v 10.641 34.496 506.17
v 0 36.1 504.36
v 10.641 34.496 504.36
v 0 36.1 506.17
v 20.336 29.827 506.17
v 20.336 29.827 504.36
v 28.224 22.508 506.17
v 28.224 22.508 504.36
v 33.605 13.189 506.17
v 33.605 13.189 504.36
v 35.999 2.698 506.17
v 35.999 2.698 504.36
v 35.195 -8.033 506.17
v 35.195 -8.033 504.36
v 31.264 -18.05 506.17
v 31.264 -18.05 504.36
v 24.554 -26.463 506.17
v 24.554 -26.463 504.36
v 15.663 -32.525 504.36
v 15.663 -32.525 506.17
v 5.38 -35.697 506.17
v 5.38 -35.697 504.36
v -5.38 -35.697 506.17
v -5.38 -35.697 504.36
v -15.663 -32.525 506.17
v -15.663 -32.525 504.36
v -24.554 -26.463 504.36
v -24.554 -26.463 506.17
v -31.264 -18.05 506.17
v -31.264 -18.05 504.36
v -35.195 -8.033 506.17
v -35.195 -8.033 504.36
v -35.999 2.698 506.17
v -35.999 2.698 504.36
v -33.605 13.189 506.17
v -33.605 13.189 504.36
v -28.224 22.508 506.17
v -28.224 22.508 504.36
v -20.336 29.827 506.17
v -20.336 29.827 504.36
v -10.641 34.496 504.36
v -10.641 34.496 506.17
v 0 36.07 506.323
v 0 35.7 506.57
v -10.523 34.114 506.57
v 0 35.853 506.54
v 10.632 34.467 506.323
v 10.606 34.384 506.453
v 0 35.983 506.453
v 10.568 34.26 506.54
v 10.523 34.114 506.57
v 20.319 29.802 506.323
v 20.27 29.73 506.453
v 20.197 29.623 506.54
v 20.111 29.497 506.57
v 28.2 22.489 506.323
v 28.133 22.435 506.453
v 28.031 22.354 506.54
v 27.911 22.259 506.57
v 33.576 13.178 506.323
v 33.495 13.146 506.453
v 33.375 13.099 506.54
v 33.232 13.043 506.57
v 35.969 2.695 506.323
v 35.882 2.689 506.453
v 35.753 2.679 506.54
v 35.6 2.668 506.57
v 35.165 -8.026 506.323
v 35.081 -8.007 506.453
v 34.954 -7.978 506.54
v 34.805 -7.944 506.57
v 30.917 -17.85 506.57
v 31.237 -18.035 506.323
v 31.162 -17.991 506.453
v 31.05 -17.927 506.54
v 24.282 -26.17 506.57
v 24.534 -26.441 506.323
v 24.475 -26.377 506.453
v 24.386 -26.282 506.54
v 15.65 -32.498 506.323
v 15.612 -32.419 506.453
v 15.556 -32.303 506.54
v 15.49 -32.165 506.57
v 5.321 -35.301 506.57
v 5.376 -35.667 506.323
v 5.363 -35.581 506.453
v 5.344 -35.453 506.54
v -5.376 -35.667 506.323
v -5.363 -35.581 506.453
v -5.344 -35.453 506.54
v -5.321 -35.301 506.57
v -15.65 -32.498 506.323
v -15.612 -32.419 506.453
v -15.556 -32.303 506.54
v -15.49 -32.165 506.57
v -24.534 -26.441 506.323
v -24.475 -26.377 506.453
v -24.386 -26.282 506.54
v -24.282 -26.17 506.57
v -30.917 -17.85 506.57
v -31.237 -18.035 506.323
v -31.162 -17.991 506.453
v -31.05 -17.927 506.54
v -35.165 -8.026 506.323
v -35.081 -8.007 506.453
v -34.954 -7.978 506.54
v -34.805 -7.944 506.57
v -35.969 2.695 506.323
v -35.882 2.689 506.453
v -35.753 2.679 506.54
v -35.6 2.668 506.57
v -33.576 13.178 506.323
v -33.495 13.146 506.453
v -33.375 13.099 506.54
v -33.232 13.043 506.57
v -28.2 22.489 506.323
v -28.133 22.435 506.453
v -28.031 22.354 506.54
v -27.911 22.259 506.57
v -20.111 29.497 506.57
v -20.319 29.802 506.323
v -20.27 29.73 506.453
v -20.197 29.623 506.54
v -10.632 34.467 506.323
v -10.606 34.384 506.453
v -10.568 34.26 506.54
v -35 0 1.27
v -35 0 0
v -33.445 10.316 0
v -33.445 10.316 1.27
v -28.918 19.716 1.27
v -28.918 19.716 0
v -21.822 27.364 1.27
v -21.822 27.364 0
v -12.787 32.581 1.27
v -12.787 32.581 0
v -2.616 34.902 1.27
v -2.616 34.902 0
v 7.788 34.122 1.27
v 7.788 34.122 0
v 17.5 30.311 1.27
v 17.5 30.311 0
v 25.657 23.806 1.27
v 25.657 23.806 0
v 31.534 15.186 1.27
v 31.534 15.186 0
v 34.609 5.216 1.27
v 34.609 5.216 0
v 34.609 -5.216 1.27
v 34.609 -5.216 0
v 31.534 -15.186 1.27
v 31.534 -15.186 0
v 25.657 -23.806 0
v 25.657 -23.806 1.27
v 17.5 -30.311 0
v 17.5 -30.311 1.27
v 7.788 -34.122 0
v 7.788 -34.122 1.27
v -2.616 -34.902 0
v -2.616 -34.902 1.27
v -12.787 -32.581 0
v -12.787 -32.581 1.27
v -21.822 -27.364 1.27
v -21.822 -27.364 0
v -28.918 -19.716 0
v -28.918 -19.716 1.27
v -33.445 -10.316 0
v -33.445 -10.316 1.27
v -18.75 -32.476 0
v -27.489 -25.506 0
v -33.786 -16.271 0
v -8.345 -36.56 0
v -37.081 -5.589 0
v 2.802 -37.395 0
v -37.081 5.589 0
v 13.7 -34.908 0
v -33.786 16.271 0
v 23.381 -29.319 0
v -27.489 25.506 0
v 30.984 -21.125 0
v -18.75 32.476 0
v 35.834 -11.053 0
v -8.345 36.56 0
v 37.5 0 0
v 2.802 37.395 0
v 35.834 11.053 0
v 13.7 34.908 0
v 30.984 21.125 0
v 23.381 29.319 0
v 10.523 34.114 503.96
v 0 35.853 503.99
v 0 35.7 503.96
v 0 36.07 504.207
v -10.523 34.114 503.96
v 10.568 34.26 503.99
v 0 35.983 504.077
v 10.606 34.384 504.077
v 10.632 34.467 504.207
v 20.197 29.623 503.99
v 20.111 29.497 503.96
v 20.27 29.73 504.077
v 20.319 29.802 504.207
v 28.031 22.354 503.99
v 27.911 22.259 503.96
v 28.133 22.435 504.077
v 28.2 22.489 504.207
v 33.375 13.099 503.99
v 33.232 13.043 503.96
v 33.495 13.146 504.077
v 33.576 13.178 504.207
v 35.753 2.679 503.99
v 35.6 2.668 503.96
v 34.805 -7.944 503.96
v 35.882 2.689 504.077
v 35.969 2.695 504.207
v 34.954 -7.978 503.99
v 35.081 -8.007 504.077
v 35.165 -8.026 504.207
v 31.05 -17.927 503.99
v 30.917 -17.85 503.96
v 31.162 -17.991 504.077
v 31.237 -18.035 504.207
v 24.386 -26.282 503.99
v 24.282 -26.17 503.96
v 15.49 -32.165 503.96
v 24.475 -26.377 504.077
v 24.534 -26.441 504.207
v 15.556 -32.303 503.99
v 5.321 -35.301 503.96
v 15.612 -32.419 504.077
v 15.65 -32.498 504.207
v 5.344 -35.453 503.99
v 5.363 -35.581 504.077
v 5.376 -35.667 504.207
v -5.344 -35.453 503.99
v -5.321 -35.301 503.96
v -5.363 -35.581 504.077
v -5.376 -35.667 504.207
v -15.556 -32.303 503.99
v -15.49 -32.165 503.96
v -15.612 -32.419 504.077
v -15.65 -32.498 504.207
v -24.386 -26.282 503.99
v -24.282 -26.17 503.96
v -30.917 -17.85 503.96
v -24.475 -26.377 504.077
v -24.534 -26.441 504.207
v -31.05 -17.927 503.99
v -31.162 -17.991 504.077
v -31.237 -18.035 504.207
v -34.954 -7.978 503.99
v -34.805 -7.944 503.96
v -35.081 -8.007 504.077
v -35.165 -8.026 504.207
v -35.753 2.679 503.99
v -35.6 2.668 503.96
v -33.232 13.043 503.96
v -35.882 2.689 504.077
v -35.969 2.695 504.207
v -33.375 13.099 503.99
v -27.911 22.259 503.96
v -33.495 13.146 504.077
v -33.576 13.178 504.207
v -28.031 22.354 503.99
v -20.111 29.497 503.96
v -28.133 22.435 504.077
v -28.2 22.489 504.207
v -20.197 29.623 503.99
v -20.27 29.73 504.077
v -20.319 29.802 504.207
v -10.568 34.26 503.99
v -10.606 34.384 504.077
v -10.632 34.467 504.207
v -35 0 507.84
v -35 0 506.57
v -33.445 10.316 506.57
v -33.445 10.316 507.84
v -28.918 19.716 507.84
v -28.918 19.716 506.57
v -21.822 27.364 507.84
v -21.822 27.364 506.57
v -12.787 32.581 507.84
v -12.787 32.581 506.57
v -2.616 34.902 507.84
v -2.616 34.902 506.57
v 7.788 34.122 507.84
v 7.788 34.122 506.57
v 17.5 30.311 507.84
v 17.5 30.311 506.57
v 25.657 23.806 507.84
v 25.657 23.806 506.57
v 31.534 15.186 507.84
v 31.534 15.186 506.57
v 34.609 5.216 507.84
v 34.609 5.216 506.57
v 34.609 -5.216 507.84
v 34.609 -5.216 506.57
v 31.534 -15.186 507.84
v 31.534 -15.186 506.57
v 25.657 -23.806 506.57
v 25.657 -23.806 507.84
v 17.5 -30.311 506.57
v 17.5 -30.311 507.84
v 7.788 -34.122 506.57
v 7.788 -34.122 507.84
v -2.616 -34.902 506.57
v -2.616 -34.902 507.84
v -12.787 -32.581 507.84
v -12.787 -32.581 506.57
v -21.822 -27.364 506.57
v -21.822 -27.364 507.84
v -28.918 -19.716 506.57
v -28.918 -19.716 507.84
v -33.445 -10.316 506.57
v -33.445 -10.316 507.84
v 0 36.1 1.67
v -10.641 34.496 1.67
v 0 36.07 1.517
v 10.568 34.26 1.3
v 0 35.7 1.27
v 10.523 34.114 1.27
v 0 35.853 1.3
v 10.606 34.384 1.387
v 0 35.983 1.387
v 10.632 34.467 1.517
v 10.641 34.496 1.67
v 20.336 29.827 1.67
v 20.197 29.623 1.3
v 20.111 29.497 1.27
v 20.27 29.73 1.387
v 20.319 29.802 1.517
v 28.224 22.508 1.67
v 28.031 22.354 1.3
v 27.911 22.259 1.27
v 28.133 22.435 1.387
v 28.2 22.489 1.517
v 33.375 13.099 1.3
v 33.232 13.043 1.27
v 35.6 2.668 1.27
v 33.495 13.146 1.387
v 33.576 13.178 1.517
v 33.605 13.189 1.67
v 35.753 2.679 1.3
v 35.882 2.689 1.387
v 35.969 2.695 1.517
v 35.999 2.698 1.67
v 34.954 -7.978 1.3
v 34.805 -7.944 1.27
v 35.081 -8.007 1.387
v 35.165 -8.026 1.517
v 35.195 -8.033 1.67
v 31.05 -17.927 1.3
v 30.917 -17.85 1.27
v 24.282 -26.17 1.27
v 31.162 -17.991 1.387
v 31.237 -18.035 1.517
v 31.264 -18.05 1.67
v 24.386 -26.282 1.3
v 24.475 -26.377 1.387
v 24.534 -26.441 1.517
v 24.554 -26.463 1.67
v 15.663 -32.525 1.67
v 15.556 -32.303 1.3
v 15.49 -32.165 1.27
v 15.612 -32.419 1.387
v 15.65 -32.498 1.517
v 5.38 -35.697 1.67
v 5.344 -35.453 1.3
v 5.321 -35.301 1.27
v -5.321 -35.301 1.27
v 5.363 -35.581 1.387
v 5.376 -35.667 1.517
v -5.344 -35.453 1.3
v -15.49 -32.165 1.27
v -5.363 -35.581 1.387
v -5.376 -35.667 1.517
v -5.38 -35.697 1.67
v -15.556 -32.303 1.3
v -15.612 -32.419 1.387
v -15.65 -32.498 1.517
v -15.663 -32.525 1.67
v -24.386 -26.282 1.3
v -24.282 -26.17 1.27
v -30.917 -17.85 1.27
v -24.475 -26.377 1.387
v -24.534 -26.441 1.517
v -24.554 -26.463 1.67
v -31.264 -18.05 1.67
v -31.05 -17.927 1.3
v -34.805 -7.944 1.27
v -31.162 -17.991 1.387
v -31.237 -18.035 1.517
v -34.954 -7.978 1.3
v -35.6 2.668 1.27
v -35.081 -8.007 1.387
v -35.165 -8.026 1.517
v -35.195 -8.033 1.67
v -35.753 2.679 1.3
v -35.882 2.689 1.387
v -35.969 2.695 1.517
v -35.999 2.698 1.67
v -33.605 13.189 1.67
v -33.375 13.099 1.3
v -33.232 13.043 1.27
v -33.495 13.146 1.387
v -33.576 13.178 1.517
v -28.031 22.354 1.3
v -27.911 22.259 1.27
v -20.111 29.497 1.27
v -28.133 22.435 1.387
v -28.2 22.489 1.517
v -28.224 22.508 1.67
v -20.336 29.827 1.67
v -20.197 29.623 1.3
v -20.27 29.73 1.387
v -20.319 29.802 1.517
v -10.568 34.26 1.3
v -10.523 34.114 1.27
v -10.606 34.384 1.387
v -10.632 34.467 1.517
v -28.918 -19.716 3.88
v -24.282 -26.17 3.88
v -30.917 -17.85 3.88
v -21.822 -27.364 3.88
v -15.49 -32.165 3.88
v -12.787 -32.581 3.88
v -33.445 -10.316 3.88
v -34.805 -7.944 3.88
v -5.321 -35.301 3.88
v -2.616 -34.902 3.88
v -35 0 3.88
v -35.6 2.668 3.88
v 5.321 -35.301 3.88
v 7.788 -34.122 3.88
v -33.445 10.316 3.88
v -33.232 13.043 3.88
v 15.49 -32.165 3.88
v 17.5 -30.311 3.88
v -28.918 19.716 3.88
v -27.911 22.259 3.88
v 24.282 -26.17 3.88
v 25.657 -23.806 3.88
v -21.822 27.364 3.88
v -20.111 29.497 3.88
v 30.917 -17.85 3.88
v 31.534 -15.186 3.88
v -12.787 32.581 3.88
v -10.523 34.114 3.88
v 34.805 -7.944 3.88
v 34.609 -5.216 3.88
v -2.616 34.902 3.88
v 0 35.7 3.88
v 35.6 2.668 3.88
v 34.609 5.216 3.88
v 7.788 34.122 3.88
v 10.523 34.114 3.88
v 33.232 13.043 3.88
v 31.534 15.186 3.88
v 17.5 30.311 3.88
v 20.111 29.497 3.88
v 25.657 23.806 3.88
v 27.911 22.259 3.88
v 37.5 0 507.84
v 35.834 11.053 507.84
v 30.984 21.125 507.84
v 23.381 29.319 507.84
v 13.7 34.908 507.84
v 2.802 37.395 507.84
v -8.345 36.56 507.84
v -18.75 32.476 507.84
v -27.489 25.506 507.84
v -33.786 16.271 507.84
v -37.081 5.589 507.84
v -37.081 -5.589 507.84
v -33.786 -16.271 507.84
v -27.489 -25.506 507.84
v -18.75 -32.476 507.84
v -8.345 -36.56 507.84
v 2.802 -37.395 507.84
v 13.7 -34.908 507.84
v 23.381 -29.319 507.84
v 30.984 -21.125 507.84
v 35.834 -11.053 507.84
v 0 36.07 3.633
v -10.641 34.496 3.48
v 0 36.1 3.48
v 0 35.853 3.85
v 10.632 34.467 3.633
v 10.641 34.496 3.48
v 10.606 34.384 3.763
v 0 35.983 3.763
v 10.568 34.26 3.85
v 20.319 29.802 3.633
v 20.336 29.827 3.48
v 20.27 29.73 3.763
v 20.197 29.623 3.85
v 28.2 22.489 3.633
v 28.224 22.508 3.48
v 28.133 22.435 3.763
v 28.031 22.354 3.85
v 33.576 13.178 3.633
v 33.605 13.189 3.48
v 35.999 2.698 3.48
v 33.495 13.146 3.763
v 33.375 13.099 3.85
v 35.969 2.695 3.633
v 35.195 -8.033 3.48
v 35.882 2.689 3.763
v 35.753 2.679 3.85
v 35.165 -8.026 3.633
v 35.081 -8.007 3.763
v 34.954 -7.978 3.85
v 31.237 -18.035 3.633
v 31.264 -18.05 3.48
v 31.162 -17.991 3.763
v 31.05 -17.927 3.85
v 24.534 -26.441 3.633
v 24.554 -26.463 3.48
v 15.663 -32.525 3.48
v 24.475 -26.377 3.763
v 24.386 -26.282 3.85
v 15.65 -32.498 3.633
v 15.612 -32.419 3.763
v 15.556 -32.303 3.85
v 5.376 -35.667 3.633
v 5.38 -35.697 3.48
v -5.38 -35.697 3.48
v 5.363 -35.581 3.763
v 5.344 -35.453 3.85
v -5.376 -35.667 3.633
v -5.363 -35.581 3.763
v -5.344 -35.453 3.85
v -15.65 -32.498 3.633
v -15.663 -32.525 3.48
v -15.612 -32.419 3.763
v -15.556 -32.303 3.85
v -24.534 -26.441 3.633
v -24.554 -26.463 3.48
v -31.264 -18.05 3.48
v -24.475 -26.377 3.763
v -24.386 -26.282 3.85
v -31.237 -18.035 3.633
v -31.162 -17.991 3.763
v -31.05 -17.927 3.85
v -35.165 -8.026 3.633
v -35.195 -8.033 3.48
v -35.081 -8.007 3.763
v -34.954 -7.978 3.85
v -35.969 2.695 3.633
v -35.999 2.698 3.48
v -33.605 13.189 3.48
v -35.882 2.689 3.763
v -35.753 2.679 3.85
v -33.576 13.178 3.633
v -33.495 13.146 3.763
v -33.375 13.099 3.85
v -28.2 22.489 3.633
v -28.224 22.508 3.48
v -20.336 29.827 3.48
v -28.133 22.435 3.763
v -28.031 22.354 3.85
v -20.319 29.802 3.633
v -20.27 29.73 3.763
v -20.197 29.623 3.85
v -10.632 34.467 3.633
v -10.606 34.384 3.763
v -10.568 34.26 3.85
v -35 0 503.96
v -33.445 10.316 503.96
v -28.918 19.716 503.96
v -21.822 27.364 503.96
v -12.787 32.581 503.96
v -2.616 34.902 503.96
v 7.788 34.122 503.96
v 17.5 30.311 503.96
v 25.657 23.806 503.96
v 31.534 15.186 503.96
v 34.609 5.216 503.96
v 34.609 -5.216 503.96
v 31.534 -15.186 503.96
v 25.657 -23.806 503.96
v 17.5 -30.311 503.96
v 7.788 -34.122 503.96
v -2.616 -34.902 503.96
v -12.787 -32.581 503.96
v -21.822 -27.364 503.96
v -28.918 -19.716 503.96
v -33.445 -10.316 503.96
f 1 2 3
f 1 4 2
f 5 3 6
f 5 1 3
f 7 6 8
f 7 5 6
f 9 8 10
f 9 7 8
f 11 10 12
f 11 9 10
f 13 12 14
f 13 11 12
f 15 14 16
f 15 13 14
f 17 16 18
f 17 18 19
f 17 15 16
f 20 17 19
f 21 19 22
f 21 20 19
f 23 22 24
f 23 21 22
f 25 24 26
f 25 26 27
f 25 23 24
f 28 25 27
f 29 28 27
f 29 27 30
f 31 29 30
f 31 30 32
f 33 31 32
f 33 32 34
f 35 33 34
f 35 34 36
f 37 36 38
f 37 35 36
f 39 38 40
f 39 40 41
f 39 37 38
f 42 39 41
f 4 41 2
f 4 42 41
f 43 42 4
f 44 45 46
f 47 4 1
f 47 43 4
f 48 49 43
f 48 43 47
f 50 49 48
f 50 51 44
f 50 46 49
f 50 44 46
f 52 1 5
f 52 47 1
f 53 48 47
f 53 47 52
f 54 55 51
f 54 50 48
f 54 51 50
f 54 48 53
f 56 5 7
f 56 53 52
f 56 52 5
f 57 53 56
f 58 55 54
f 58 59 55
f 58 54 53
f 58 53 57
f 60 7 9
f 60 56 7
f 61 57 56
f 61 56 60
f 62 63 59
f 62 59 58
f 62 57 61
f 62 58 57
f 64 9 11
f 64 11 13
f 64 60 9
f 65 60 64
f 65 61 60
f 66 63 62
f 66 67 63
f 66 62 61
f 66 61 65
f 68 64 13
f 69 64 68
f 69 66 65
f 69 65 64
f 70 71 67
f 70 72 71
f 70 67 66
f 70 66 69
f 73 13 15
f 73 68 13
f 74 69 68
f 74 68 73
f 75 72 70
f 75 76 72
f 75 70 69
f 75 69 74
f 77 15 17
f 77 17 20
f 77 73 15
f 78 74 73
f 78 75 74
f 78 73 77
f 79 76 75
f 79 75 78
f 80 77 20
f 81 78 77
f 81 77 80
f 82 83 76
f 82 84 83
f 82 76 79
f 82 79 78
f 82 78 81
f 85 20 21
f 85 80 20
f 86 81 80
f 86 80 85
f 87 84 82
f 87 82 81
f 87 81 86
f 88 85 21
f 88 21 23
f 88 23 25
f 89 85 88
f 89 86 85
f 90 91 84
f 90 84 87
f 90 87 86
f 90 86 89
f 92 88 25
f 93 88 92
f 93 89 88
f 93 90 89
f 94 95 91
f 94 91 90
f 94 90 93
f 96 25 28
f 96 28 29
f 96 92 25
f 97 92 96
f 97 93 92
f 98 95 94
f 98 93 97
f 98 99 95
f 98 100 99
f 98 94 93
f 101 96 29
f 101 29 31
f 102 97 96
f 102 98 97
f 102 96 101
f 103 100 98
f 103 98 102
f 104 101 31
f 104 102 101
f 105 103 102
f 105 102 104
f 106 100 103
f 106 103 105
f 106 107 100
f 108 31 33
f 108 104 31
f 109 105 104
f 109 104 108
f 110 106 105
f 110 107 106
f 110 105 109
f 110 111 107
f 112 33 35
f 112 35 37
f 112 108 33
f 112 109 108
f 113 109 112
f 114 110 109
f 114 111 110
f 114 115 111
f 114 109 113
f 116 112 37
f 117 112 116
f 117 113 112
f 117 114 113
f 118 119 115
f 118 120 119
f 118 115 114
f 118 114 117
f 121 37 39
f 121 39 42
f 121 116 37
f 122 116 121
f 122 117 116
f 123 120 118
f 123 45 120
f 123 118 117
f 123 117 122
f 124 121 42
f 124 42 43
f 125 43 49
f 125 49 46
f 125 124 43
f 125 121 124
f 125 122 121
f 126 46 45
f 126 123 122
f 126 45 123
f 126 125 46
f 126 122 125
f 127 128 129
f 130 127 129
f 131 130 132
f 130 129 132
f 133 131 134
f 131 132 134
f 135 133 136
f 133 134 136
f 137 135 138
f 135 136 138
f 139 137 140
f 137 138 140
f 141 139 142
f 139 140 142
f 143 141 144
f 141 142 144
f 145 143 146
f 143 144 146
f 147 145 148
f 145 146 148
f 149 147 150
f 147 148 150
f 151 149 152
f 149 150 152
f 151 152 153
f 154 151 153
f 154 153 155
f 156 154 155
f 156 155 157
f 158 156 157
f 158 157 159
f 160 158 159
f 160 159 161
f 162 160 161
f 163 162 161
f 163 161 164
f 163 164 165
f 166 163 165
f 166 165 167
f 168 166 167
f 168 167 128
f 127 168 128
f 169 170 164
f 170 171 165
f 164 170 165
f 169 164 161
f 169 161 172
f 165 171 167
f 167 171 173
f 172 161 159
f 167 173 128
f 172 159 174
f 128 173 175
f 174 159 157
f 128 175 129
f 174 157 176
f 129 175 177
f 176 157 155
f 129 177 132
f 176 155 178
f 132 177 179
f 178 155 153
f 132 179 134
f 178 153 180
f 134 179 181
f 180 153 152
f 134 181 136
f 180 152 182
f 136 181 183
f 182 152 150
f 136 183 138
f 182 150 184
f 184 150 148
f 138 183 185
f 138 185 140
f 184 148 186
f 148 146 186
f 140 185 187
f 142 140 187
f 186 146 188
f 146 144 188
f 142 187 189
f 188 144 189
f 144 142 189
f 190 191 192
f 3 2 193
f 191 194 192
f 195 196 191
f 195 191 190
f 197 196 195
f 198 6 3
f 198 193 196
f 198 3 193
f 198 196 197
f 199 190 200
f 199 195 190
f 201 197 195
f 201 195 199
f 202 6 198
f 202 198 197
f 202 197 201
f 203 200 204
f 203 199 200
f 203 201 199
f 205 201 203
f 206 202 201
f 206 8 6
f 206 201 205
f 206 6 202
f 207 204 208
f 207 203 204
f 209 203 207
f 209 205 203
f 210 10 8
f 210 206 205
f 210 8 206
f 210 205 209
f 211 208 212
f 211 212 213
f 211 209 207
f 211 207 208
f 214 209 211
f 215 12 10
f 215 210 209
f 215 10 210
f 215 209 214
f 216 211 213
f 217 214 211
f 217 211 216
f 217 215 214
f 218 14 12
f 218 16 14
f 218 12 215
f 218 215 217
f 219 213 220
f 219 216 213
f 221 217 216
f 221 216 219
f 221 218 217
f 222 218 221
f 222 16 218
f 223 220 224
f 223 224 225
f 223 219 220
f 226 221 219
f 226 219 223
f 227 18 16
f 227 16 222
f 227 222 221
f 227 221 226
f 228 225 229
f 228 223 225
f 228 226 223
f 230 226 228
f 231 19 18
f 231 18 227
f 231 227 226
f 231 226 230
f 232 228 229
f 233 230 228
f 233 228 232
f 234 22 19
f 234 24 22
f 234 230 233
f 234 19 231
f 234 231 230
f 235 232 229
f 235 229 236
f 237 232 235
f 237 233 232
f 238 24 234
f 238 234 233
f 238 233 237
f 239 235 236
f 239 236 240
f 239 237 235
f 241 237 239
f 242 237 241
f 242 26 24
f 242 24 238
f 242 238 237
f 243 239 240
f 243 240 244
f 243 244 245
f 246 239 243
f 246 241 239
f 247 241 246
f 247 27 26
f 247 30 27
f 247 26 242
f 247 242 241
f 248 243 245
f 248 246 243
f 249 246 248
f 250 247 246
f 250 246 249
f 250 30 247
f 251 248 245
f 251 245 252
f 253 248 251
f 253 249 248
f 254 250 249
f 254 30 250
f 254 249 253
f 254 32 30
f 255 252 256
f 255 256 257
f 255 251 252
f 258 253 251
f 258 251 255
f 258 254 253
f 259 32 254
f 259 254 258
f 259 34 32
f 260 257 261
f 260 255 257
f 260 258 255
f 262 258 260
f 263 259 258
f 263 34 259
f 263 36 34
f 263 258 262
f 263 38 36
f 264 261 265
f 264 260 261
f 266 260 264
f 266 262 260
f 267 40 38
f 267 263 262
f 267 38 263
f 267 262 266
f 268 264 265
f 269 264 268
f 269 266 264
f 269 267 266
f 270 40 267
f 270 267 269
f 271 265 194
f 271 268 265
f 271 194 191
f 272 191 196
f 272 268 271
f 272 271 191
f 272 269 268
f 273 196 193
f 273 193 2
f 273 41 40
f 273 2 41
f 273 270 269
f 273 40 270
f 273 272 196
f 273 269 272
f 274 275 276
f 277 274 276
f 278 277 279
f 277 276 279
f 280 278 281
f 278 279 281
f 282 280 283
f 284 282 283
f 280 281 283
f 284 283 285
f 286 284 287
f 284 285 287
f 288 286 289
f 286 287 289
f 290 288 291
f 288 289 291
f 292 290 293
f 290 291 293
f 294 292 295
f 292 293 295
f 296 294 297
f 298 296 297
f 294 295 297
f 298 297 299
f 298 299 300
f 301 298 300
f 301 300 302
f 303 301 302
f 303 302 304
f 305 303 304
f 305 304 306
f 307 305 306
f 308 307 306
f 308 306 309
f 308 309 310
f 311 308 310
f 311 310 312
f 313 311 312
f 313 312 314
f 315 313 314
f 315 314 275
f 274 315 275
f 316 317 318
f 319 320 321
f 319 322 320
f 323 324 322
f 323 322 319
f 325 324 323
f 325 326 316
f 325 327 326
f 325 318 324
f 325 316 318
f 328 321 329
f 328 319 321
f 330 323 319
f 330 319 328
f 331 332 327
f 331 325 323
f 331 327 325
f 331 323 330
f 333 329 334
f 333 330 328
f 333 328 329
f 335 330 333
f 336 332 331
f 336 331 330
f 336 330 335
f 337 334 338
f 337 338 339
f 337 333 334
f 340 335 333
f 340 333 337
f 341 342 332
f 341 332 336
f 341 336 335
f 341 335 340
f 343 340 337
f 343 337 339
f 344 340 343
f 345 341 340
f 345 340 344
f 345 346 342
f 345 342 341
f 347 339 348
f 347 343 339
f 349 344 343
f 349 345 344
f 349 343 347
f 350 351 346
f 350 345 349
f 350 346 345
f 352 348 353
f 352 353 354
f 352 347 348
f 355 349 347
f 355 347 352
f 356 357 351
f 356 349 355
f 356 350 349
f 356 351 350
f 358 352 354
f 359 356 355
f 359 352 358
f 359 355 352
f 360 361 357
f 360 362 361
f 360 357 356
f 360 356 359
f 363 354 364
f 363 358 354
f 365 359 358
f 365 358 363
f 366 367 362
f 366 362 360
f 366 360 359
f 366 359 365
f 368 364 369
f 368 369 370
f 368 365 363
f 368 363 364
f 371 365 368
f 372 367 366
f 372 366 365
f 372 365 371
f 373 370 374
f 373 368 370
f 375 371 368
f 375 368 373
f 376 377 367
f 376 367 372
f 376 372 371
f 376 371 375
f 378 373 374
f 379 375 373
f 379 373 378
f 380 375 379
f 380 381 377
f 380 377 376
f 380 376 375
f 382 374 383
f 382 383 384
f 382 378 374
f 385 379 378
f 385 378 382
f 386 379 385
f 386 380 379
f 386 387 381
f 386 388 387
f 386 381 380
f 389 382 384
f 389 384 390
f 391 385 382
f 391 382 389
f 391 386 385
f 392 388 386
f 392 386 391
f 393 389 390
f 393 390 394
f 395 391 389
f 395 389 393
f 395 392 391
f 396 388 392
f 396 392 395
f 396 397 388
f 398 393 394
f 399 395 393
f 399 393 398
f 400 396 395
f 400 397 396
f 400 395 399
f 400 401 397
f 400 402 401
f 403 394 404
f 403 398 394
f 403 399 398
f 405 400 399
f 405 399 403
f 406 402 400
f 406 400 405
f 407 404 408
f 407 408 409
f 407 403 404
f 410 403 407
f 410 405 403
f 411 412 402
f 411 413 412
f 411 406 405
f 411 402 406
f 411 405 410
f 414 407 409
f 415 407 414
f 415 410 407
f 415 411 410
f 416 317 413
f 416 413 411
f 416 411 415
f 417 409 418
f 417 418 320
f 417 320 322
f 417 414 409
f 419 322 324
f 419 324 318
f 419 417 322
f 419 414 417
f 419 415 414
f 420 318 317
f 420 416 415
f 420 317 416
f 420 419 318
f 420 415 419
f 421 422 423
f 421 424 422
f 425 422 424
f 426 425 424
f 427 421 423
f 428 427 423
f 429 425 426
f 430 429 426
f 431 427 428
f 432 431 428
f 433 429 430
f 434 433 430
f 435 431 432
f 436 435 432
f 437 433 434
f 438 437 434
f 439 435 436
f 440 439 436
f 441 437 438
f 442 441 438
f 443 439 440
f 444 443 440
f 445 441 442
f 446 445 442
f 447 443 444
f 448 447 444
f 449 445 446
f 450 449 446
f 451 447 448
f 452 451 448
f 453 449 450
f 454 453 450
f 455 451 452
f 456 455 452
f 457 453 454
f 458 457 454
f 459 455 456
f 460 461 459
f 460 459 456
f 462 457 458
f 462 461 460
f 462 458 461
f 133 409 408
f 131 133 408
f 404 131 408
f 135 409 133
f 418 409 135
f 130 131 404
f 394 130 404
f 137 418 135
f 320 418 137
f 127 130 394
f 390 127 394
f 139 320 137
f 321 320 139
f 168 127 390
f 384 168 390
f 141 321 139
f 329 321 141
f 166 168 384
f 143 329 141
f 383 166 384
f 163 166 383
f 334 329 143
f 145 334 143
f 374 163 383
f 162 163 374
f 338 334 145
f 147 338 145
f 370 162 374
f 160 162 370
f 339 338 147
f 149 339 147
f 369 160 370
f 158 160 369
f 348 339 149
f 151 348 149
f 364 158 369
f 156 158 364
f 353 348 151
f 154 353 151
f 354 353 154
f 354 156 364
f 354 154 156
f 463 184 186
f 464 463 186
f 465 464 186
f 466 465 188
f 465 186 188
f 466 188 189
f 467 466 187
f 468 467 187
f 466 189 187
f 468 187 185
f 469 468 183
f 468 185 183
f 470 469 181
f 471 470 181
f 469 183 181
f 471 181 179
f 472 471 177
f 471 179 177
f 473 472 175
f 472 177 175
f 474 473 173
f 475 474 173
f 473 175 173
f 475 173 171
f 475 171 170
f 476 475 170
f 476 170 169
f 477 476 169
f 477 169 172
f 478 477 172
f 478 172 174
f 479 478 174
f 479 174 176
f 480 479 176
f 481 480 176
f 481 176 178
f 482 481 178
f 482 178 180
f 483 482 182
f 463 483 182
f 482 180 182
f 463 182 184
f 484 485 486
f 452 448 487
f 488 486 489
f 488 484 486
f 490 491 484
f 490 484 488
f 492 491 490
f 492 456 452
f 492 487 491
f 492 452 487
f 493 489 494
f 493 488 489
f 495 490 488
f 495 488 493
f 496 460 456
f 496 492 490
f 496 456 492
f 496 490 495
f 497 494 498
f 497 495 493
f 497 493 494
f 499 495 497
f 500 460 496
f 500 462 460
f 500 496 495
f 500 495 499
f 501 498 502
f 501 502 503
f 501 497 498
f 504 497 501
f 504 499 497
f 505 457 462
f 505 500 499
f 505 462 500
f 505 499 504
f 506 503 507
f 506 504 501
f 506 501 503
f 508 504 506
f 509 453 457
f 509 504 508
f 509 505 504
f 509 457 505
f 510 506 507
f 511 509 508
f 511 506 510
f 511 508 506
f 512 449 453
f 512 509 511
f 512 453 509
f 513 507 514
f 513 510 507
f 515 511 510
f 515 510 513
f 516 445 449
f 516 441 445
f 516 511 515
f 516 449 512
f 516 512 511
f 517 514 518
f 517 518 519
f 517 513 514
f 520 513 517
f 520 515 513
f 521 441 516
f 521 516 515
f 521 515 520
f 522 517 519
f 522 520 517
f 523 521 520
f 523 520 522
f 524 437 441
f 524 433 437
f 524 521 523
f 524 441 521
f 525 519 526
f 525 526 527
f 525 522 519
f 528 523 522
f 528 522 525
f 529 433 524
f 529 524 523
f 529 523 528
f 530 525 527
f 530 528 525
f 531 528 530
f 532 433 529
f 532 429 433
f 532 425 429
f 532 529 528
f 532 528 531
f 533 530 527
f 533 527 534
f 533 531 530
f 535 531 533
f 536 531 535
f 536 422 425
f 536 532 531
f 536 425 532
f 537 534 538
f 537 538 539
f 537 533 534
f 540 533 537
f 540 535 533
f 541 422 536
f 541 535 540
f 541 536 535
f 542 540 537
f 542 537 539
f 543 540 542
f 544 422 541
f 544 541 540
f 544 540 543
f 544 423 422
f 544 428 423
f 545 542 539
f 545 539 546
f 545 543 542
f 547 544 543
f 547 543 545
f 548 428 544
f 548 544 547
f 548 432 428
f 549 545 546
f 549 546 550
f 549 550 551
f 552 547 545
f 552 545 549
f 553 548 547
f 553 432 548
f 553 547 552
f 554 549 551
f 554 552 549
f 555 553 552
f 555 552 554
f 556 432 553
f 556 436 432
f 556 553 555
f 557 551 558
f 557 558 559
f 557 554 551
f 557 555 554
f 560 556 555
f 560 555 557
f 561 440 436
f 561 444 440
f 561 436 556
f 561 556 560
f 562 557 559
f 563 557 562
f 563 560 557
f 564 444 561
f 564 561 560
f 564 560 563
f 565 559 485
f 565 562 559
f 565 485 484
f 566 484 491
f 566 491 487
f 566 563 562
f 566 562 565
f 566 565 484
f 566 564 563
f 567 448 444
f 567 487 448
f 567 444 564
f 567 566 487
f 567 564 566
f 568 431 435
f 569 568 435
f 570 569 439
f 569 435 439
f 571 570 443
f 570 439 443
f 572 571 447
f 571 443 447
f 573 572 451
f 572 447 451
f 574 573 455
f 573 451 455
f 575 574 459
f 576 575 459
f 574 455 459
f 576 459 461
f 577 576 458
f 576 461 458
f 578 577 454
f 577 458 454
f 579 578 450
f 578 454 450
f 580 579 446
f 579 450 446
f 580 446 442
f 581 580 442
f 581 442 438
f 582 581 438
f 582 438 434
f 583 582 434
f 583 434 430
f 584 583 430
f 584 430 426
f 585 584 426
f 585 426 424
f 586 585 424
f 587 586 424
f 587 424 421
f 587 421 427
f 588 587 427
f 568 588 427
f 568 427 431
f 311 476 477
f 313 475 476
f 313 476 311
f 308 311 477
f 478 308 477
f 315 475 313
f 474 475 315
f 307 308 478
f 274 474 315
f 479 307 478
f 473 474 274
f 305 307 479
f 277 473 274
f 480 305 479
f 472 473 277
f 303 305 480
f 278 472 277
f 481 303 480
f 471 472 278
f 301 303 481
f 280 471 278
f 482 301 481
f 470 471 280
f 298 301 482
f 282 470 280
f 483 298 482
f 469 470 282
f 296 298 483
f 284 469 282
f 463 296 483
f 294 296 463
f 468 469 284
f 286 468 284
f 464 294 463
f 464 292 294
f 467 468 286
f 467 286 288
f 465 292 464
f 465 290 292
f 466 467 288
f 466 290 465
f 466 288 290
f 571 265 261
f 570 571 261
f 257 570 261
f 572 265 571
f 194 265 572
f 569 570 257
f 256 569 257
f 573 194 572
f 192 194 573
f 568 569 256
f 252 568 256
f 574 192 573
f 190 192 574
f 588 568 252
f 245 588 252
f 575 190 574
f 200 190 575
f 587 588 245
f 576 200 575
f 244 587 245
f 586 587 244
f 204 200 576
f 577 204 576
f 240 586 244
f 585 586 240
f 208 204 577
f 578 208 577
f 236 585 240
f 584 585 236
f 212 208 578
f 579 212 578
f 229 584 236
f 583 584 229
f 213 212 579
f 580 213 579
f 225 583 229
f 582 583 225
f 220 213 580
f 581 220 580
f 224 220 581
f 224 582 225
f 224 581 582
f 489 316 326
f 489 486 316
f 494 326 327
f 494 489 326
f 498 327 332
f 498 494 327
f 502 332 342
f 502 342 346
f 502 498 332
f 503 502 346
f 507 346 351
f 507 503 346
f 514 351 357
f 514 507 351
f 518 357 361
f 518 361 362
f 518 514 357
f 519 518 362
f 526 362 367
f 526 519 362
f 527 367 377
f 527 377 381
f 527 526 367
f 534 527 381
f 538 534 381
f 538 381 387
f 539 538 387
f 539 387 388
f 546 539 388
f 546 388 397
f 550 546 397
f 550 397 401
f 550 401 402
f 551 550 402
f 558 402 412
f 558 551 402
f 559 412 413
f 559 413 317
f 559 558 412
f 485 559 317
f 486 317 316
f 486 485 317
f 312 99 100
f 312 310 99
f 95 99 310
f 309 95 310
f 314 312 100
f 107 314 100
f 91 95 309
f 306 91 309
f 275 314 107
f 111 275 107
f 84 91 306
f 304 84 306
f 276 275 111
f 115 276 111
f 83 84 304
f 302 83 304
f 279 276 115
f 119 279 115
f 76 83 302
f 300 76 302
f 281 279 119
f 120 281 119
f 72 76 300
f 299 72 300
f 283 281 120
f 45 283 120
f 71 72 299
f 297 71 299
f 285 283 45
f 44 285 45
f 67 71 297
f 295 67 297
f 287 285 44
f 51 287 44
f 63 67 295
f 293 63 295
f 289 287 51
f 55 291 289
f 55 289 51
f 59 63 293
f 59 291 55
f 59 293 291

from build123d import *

# Parameters (mm, degrees)
SKETCH1_R           = 37.500000057
BOSS_EXTRUDE1_DEPTH = 507.84
SKETCH3_R           = 35
CUT_EXTRUDE1_DEPTH  = 507.84


with BuildPart() as part:
    # Sketch1 → Boss-Extrude1 (new body)
    with BuildSketch(Plane.XY):
        Circle(SKETCH1_R)
    extrude(amount=BOSS_EXTRUDE1_DEPTH)

    # Sketch3 → Cut-Extrude1 (cut)
    with BuildSketch(Plane(origin=(0, 0, 0), x_dir=(-1, 0, 0), z_dir=(0, 0, -1))):
        Circle(SKETCH3_R)
    extrude(amount=-CUT_EXTRUDE1_DEPTH, mode=Mode.SUBTRACT)

    # Sketch9 → Groove for ANSI B27.7 - 3BM1-68_ Basic I (revolve, cut)
    with BuildSketch(Plane(origin=(0, 0, 507.84), x_dir=(0, 1, 0), z_dir=(-1, 0, 0))):
        with BuildLine():
            Line((35.7, 503.96), (31.5, 503.96))
            Line((31.5, 503.96), (31.5, 506.57))
            Line((31.5, 506.57), (35.7, 506.57))
            ThreePointArc((35.7, 506.57), (35.982842712, 506.452842712), (36.1, 506.17))
            Line((36.1, 506.17), (36.1, 504.36))
            ThreePointArc((36.1, 504.36), (35.982842712, 504.077157288), (35.7, 503.96))
        make_face()
    revolve(axis=Axis((0, 0, 557.84), (0, 0, -1)), mode=Mode.SUBTRACT)

    # Sketch11 → Groove for ANSI B27.7 - 3BM1-68_ Bas 2 (revolve, cut)
    with BuildSketch(Plane(origin=(0, 0, 507.84), x_dir=(0, 1, 0), z_dir=(-1, 0, 0))):
        with BuildLine():
            Line((35.7, 1.27), (31.5, 1.27))
            Line((31.5, 1.27), (31.5, 3.88))
            Line((31.5, 3.88), (35.7, 3.88))
            ThreePointArc((35.7, 3.88), (35.982842712, 3.762842712), (36.1, 3.48))
            Line((36.1, 3.48), (36.1, 1.67))
            ThreePointArc((36.1, 1.67), (35.982842712, 1.387157288), (35.7, 1.27))
        make_face()
    revolve(axis=Axis((0, 0, 557.84), (0, 0, -1)), mode=Mode.SUBTRACT)


solid = part.part
